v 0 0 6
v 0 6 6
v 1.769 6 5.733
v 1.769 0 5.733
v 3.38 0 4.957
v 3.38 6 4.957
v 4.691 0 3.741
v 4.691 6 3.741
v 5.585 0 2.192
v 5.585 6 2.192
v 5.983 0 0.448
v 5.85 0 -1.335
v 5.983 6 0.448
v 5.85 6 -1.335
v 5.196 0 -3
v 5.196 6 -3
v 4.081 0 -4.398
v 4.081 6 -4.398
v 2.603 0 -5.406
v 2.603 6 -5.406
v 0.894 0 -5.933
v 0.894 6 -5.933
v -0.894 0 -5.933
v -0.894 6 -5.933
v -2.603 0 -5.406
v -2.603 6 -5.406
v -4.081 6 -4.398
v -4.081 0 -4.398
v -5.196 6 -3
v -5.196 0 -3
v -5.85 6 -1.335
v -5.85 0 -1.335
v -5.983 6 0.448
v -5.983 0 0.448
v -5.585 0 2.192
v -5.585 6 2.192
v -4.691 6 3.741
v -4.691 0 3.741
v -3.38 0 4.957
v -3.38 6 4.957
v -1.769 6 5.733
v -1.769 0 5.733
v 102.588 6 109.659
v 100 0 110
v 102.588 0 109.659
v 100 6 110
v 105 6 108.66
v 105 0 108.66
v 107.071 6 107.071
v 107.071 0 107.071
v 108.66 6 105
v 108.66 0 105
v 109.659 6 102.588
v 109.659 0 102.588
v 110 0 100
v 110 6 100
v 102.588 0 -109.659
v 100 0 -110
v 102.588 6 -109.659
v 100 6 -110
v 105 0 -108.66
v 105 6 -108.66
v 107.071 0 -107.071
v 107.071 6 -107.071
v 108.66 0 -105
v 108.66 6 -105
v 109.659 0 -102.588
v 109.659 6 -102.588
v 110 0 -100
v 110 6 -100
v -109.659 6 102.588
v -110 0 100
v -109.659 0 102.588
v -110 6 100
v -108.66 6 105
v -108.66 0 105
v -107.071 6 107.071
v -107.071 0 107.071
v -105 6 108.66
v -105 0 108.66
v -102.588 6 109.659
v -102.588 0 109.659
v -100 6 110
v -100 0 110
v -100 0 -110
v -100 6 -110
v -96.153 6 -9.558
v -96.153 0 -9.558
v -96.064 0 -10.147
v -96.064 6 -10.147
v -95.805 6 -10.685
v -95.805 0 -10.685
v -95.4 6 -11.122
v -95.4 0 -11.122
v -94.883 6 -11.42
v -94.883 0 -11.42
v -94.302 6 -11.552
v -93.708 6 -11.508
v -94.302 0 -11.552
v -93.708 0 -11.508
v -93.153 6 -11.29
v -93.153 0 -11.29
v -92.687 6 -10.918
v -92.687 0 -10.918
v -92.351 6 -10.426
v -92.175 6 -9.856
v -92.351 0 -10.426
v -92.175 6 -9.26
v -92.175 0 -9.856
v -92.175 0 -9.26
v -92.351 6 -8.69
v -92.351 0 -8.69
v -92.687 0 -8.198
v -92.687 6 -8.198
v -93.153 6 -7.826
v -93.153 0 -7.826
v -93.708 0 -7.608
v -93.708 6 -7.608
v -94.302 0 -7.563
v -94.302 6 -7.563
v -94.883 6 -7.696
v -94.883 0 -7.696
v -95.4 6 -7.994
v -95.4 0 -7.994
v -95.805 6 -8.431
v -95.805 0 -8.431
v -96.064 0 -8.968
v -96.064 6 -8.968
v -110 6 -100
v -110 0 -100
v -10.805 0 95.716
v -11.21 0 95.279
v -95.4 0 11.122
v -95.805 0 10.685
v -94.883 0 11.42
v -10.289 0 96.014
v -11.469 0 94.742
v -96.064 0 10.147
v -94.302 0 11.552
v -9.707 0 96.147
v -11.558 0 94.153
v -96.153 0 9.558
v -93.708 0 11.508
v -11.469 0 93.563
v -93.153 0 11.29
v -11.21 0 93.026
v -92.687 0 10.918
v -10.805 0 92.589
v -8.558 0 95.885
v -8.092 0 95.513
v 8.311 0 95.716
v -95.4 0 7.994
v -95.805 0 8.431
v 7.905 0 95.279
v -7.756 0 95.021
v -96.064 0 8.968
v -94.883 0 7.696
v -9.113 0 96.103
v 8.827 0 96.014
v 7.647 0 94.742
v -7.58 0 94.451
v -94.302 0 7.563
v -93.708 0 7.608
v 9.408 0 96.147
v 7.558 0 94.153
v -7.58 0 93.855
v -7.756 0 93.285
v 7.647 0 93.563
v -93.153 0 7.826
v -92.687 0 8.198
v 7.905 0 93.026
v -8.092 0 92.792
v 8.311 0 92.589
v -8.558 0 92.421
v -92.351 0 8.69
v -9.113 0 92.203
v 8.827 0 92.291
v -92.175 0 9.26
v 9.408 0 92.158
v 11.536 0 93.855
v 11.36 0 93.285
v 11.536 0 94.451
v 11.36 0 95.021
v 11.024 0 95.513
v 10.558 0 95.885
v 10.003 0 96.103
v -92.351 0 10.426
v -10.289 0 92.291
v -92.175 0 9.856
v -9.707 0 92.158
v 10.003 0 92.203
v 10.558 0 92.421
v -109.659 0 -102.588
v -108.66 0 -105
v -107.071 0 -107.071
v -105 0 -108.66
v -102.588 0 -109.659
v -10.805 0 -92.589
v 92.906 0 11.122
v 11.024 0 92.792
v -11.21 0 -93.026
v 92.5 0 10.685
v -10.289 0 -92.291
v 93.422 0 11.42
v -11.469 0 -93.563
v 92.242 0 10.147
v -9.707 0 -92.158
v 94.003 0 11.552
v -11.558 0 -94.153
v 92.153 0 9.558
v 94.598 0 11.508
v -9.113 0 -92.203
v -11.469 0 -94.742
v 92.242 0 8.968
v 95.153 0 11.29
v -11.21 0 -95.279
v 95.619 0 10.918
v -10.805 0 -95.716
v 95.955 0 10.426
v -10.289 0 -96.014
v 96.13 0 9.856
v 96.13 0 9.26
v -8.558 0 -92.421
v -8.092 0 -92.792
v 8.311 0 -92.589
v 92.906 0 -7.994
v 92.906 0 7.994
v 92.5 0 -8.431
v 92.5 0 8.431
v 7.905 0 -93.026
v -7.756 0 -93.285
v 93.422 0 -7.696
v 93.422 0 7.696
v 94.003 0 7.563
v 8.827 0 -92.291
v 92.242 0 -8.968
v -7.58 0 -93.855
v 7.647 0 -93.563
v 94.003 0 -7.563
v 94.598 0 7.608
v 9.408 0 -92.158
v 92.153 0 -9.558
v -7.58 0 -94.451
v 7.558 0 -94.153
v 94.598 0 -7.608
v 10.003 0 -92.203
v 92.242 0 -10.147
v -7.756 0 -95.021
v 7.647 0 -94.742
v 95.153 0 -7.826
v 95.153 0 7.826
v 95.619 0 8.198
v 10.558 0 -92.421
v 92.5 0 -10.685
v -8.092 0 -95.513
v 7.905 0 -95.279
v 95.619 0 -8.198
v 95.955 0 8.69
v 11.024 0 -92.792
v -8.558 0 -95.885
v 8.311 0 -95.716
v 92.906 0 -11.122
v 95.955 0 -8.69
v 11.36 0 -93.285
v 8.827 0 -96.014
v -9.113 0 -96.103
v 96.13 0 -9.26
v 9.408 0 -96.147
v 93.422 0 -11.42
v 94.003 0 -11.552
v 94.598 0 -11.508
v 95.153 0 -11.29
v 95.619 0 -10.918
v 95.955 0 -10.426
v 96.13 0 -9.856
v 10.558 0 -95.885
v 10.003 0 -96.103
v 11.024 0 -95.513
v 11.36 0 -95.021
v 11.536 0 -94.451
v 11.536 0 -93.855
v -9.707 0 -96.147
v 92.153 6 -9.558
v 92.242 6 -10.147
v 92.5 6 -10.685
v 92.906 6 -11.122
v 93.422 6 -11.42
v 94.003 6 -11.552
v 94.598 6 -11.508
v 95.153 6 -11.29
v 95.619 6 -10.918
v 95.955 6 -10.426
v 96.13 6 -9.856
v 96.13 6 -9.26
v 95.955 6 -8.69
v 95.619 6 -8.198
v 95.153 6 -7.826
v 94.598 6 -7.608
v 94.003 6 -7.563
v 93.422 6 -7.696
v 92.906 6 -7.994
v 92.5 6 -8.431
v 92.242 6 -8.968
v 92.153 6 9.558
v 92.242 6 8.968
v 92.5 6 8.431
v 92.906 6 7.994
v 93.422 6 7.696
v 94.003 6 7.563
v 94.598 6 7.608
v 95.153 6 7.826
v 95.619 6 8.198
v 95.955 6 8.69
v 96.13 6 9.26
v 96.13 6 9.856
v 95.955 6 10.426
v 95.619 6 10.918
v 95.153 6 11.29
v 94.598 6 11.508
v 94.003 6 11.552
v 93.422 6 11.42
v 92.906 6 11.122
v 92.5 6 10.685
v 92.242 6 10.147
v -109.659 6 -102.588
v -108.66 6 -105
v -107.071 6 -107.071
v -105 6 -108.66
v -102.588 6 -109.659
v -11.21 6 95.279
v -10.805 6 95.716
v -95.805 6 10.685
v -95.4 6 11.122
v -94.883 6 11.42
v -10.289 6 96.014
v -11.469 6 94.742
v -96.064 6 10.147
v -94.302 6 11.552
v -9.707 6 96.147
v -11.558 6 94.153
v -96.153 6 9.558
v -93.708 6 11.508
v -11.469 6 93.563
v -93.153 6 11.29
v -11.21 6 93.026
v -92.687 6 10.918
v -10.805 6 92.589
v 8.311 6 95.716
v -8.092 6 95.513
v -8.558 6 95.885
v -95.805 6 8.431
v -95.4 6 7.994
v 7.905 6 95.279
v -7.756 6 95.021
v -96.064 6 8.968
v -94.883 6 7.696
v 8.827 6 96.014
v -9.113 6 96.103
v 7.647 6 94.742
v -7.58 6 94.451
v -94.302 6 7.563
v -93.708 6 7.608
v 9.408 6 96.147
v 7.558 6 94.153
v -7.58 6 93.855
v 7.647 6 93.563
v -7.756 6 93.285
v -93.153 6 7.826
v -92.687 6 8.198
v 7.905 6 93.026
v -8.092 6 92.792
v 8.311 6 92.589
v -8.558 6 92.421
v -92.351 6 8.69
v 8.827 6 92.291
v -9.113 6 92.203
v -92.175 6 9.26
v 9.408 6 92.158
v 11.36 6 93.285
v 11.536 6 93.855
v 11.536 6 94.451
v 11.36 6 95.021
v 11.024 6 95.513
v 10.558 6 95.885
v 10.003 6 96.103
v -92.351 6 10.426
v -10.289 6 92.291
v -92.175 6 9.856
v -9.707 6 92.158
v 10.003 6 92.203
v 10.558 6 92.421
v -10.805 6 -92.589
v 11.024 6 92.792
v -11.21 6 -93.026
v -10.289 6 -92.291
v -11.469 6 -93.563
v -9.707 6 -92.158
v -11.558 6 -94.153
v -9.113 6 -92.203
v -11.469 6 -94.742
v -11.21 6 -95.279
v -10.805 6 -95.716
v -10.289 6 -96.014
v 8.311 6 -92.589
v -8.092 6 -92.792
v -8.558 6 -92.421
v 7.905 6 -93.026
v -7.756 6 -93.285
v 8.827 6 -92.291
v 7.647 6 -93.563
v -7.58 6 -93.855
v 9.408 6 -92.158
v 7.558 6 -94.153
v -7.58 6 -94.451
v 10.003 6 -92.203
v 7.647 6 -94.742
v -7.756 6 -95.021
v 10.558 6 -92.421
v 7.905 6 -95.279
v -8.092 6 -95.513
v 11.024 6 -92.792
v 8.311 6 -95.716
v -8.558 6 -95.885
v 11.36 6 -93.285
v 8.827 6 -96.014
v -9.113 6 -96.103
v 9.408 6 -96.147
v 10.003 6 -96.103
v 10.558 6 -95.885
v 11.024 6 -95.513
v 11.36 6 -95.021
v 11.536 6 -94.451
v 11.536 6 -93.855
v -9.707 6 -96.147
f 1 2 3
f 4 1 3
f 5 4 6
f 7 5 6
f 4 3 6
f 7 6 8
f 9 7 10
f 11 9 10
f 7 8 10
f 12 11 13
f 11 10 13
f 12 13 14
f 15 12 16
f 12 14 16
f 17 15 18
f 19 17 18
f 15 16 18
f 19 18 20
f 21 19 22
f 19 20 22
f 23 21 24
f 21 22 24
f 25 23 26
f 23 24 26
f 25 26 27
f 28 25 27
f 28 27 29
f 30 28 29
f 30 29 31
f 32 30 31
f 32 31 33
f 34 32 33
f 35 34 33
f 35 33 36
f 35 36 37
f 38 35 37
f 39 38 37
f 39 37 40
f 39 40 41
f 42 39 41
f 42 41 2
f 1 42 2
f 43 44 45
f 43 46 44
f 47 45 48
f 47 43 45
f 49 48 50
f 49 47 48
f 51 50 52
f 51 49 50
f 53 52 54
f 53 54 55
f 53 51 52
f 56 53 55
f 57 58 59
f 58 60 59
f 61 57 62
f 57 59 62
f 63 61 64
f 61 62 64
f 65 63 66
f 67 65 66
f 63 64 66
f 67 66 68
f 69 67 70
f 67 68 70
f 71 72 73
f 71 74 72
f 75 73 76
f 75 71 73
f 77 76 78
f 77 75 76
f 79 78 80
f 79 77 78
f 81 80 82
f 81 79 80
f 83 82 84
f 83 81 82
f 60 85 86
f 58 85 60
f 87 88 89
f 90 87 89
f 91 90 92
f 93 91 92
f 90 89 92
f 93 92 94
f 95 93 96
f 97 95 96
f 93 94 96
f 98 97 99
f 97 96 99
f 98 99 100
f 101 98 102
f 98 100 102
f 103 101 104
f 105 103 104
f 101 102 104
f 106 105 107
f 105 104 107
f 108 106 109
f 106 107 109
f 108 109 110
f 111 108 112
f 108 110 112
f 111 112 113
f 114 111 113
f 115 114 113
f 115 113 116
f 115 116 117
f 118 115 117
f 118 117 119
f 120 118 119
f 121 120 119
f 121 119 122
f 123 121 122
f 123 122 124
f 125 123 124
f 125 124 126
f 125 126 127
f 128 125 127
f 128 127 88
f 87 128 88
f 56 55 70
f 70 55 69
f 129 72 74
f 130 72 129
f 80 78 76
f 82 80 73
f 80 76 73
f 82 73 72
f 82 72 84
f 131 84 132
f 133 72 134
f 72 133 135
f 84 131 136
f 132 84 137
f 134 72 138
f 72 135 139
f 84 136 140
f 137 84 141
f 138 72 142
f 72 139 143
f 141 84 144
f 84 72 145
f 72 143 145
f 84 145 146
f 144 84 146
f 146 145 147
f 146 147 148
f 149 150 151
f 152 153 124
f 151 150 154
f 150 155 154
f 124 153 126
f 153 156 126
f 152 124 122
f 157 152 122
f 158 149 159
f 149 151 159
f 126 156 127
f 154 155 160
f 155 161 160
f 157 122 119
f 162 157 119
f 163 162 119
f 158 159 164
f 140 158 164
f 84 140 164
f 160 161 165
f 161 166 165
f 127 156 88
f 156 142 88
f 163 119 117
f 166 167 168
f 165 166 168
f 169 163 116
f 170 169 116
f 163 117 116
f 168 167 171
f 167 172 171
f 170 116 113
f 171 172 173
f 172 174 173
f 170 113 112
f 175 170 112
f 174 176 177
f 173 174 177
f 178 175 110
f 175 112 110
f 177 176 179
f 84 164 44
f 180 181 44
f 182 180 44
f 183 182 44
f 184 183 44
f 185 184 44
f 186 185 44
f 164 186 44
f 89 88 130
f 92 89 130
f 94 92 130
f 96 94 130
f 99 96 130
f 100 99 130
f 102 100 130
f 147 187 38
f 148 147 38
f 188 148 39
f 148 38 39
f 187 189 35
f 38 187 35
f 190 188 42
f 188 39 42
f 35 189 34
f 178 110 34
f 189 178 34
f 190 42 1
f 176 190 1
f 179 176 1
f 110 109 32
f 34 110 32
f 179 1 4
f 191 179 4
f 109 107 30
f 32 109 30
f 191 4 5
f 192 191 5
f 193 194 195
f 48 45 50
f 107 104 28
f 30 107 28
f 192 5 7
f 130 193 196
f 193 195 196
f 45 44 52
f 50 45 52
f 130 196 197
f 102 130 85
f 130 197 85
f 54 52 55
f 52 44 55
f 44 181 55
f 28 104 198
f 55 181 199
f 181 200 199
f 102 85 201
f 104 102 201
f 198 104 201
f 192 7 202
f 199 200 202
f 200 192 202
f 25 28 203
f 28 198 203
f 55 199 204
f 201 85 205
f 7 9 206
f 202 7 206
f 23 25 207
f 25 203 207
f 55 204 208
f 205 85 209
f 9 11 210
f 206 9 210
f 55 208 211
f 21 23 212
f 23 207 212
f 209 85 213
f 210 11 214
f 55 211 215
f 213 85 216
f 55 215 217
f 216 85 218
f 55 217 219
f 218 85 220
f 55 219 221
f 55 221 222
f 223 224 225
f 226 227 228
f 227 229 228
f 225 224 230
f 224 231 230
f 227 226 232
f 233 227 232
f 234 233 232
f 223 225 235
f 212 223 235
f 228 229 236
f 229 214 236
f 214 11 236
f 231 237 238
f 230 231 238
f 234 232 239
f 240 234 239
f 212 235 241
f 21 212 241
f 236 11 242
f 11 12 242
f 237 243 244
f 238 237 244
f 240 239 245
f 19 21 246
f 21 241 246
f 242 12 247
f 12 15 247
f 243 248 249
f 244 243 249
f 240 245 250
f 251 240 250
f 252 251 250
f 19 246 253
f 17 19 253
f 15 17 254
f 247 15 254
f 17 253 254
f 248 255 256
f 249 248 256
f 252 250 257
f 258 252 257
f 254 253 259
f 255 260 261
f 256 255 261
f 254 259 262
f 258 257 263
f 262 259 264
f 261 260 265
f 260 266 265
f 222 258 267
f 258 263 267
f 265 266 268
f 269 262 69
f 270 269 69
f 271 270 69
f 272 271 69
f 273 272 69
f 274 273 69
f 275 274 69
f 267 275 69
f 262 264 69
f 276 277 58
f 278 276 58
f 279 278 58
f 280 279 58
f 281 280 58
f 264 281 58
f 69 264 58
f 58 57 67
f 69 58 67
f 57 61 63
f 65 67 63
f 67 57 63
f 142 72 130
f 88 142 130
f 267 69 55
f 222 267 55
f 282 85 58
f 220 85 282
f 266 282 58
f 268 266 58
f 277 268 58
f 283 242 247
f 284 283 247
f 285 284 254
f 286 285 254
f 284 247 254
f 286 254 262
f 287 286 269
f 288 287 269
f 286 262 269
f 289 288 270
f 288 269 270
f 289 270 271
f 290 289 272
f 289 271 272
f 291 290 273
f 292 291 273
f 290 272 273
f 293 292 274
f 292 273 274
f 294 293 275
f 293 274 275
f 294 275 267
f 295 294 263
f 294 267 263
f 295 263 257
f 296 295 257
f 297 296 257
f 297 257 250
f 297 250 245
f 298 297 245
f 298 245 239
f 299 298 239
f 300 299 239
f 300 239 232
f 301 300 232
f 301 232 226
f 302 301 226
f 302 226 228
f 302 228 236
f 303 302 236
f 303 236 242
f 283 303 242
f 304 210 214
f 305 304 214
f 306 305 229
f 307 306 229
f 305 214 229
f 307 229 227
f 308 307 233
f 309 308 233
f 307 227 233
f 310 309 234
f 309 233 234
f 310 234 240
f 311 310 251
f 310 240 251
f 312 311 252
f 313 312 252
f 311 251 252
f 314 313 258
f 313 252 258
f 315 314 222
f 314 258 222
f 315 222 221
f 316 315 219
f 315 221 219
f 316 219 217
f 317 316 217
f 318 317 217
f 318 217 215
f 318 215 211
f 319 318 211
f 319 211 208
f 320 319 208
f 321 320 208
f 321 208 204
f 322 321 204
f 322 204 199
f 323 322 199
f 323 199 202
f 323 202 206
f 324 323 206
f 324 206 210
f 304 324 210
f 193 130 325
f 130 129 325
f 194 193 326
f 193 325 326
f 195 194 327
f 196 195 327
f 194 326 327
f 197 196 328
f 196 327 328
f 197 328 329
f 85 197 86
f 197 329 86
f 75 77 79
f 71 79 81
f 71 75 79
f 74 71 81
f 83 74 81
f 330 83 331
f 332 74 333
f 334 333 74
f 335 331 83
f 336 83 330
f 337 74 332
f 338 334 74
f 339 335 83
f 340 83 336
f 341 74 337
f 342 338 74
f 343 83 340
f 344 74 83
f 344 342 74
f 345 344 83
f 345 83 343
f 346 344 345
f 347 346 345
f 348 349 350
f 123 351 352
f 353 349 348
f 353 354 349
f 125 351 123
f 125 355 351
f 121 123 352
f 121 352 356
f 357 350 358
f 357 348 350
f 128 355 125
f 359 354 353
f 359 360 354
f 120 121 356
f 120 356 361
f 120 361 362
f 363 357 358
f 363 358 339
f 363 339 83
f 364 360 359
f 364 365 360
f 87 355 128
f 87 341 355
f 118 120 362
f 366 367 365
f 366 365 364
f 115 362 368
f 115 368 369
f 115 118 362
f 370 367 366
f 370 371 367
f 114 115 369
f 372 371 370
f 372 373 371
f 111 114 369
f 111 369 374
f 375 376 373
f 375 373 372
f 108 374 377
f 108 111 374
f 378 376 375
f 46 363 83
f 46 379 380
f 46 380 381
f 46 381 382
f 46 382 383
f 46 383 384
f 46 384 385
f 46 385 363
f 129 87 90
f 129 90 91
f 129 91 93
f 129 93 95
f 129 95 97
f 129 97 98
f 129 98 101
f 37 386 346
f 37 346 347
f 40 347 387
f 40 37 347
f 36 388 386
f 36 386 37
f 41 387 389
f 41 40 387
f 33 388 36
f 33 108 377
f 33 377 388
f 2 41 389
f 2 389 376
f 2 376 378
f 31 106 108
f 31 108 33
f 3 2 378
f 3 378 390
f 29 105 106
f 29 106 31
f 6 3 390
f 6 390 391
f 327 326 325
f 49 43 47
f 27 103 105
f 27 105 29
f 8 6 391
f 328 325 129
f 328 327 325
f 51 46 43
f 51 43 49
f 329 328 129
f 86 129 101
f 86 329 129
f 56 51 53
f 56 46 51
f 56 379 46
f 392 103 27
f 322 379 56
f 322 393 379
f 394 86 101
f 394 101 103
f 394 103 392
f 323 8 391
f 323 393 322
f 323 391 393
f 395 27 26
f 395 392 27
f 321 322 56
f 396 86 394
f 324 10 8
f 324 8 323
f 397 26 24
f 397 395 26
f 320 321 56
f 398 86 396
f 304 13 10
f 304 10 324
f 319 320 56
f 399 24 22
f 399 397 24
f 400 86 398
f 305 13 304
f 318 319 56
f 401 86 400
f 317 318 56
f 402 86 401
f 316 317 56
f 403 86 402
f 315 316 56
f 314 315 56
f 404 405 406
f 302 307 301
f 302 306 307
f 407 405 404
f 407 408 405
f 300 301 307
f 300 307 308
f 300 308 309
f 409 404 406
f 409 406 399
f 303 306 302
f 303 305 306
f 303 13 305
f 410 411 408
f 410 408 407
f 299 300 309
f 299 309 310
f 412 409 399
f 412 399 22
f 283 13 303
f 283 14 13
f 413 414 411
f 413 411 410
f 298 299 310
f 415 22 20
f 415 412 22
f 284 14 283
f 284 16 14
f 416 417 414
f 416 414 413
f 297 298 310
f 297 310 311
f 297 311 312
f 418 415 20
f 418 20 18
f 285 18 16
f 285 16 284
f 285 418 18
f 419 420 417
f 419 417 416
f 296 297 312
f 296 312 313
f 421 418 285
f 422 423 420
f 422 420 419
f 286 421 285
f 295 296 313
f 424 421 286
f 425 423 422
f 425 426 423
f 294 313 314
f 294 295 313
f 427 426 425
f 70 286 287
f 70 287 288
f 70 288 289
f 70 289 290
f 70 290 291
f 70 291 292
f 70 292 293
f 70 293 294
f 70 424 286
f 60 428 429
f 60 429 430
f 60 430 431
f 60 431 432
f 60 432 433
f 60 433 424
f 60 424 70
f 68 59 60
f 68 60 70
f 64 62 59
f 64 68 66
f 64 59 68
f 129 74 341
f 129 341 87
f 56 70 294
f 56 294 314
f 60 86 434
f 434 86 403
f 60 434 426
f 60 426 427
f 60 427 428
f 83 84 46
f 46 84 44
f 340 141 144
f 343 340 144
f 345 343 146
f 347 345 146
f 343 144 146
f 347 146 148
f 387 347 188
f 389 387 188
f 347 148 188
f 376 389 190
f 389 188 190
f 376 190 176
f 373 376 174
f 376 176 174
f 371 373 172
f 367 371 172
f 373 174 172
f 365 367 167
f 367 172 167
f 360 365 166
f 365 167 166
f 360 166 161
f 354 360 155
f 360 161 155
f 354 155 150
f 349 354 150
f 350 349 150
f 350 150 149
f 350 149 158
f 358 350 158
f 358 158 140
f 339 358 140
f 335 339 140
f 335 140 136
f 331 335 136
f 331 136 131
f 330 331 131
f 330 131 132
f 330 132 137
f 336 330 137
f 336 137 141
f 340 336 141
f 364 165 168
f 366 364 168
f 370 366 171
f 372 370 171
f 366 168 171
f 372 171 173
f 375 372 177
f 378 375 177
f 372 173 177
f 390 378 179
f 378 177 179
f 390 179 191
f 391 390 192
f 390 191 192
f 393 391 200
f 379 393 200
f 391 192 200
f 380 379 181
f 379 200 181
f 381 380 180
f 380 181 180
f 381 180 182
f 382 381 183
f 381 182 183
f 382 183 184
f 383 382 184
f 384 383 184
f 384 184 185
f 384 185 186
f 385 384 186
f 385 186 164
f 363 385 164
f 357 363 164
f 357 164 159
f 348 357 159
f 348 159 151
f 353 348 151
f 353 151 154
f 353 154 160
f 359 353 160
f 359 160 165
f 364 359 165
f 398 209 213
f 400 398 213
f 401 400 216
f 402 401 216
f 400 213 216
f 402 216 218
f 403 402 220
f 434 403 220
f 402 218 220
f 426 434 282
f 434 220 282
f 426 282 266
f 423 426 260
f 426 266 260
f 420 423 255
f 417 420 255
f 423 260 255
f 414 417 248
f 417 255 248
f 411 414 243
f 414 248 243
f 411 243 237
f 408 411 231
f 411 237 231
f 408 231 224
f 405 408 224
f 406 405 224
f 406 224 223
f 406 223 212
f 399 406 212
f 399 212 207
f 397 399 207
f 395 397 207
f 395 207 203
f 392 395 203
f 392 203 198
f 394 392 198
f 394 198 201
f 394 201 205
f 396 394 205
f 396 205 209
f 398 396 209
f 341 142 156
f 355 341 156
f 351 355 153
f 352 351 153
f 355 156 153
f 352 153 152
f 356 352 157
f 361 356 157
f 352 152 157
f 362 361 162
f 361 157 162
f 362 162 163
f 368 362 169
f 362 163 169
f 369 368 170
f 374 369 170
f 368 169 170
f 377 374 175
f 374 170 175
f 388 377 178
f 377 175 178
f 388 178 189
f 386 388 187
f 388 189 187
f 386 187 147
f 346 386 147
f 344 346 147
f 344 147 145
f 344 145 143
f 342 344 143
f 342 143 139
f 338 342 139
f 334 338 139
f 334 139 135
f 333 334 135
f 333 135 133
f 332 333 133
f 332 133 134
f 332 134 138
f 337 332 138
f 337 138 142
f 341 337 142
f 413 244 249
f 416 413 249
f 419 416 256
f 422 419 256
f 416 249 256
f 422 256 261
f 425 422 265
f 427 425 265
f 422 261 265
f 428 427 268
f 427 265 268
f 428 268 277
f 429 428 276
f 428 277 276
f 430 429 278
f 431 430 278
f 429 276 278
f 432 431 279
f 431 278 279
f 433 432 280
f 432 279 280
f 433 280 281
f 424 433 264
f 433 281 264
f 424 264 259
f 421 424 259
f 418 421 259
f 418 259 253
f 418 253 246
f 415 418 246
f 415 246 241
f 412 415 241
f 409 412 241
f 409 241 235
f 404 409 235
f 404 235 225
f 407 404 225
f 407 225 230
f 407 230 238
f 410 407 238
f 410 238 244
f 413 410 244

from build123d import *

# Parameters (mm, degrees)
SKETCH1_W                 = 220
SKETCH1_H                 = 220
BOSS_EXTRUDE1_DEPTH       = 6
SKETCH2_R                 = 6
CUT_EXTRUDE1_DEPTH        = 51
FILLET1_R                 = 10
F_4_0MM_DOWEL_HOLE1_D     = 4
F_4_0MM_DOWEL_HOLE1_DEPTH = 25.4
F_4_0MM_DOWEL_HOLE1_TIP   = 1.201721238


with BuildPart() as part:
    # Sketch1 → Boss-Extrude1 (new body)
    with BuildSketch(Plane(origin=(0, 0, 0), x_dir=(1, 0, 0), z_dir=(0, 1, 0))):
        Rectangle(SKETCH1_W, SKETCH1_H)
    extrude(amount=BOSS_EXTRUDE1_DEPTH)

    # Sketch2 → Cut-Extrude1 (cut)
    with BuildSketch(Plane(origin=(0, 6, 0), x_dir=(1, 0, 0), z_dir=(0, 1, 0))):
        with Locations(Location((0, 0, 0), (0, 0, 270))):
            Circle(SKETCH2_R)
    extrude(amount=-CUT_EXTRUDE1_DEPTH, mode=Mode.SUBTRACT)

    # Fillet1
    fillet1_edges = [part.edges().sort_by_distance(p)[0] for p in [
        (-110, 3, -110),
        (110, 3, -110),
        (110, 3, 110),
        (-110, 3, 110),
    ]]
    fillet(fillet1_edges, radius=FILLET1_R)

    # Ø4.0mm Dowel Hole1
    with Locations(Plane(origin=(0, 6, 0), x_dir=(1, 0, 0), z_dir=(0, 1, 0))):
        with Locations((-9.557884959, -94.152737777), (9.557884959, -94.152737777), (94.152737777, -9.557884959), (94.152737777, 9.557884959), (9.557884959, 94.152737777), (-9.557884959, 94.152737777), (-94.152737777, 9.557884959), (-94.152737777, -9.557884959)):
            Hole(F_4_0MM_DOWEL_HOLE1_D / 2, depth=F_4_0MM_DOWEL_HOLE1_DEPTH)
            with Locations((0, 0, -(F_4_0MM_DOWEL_HOLE1_DEPTH + F_4_0MM_DOWEL_HOLE1_TIP / 2))):  # 118° drill point
                Cone(0, F_4_0MM_DOWEL_HOLE1_D / 2, F_4_0MM_DOWEL_HOLE1_TIP, mode=Mode.SUBTRACT)


solid = part.part
